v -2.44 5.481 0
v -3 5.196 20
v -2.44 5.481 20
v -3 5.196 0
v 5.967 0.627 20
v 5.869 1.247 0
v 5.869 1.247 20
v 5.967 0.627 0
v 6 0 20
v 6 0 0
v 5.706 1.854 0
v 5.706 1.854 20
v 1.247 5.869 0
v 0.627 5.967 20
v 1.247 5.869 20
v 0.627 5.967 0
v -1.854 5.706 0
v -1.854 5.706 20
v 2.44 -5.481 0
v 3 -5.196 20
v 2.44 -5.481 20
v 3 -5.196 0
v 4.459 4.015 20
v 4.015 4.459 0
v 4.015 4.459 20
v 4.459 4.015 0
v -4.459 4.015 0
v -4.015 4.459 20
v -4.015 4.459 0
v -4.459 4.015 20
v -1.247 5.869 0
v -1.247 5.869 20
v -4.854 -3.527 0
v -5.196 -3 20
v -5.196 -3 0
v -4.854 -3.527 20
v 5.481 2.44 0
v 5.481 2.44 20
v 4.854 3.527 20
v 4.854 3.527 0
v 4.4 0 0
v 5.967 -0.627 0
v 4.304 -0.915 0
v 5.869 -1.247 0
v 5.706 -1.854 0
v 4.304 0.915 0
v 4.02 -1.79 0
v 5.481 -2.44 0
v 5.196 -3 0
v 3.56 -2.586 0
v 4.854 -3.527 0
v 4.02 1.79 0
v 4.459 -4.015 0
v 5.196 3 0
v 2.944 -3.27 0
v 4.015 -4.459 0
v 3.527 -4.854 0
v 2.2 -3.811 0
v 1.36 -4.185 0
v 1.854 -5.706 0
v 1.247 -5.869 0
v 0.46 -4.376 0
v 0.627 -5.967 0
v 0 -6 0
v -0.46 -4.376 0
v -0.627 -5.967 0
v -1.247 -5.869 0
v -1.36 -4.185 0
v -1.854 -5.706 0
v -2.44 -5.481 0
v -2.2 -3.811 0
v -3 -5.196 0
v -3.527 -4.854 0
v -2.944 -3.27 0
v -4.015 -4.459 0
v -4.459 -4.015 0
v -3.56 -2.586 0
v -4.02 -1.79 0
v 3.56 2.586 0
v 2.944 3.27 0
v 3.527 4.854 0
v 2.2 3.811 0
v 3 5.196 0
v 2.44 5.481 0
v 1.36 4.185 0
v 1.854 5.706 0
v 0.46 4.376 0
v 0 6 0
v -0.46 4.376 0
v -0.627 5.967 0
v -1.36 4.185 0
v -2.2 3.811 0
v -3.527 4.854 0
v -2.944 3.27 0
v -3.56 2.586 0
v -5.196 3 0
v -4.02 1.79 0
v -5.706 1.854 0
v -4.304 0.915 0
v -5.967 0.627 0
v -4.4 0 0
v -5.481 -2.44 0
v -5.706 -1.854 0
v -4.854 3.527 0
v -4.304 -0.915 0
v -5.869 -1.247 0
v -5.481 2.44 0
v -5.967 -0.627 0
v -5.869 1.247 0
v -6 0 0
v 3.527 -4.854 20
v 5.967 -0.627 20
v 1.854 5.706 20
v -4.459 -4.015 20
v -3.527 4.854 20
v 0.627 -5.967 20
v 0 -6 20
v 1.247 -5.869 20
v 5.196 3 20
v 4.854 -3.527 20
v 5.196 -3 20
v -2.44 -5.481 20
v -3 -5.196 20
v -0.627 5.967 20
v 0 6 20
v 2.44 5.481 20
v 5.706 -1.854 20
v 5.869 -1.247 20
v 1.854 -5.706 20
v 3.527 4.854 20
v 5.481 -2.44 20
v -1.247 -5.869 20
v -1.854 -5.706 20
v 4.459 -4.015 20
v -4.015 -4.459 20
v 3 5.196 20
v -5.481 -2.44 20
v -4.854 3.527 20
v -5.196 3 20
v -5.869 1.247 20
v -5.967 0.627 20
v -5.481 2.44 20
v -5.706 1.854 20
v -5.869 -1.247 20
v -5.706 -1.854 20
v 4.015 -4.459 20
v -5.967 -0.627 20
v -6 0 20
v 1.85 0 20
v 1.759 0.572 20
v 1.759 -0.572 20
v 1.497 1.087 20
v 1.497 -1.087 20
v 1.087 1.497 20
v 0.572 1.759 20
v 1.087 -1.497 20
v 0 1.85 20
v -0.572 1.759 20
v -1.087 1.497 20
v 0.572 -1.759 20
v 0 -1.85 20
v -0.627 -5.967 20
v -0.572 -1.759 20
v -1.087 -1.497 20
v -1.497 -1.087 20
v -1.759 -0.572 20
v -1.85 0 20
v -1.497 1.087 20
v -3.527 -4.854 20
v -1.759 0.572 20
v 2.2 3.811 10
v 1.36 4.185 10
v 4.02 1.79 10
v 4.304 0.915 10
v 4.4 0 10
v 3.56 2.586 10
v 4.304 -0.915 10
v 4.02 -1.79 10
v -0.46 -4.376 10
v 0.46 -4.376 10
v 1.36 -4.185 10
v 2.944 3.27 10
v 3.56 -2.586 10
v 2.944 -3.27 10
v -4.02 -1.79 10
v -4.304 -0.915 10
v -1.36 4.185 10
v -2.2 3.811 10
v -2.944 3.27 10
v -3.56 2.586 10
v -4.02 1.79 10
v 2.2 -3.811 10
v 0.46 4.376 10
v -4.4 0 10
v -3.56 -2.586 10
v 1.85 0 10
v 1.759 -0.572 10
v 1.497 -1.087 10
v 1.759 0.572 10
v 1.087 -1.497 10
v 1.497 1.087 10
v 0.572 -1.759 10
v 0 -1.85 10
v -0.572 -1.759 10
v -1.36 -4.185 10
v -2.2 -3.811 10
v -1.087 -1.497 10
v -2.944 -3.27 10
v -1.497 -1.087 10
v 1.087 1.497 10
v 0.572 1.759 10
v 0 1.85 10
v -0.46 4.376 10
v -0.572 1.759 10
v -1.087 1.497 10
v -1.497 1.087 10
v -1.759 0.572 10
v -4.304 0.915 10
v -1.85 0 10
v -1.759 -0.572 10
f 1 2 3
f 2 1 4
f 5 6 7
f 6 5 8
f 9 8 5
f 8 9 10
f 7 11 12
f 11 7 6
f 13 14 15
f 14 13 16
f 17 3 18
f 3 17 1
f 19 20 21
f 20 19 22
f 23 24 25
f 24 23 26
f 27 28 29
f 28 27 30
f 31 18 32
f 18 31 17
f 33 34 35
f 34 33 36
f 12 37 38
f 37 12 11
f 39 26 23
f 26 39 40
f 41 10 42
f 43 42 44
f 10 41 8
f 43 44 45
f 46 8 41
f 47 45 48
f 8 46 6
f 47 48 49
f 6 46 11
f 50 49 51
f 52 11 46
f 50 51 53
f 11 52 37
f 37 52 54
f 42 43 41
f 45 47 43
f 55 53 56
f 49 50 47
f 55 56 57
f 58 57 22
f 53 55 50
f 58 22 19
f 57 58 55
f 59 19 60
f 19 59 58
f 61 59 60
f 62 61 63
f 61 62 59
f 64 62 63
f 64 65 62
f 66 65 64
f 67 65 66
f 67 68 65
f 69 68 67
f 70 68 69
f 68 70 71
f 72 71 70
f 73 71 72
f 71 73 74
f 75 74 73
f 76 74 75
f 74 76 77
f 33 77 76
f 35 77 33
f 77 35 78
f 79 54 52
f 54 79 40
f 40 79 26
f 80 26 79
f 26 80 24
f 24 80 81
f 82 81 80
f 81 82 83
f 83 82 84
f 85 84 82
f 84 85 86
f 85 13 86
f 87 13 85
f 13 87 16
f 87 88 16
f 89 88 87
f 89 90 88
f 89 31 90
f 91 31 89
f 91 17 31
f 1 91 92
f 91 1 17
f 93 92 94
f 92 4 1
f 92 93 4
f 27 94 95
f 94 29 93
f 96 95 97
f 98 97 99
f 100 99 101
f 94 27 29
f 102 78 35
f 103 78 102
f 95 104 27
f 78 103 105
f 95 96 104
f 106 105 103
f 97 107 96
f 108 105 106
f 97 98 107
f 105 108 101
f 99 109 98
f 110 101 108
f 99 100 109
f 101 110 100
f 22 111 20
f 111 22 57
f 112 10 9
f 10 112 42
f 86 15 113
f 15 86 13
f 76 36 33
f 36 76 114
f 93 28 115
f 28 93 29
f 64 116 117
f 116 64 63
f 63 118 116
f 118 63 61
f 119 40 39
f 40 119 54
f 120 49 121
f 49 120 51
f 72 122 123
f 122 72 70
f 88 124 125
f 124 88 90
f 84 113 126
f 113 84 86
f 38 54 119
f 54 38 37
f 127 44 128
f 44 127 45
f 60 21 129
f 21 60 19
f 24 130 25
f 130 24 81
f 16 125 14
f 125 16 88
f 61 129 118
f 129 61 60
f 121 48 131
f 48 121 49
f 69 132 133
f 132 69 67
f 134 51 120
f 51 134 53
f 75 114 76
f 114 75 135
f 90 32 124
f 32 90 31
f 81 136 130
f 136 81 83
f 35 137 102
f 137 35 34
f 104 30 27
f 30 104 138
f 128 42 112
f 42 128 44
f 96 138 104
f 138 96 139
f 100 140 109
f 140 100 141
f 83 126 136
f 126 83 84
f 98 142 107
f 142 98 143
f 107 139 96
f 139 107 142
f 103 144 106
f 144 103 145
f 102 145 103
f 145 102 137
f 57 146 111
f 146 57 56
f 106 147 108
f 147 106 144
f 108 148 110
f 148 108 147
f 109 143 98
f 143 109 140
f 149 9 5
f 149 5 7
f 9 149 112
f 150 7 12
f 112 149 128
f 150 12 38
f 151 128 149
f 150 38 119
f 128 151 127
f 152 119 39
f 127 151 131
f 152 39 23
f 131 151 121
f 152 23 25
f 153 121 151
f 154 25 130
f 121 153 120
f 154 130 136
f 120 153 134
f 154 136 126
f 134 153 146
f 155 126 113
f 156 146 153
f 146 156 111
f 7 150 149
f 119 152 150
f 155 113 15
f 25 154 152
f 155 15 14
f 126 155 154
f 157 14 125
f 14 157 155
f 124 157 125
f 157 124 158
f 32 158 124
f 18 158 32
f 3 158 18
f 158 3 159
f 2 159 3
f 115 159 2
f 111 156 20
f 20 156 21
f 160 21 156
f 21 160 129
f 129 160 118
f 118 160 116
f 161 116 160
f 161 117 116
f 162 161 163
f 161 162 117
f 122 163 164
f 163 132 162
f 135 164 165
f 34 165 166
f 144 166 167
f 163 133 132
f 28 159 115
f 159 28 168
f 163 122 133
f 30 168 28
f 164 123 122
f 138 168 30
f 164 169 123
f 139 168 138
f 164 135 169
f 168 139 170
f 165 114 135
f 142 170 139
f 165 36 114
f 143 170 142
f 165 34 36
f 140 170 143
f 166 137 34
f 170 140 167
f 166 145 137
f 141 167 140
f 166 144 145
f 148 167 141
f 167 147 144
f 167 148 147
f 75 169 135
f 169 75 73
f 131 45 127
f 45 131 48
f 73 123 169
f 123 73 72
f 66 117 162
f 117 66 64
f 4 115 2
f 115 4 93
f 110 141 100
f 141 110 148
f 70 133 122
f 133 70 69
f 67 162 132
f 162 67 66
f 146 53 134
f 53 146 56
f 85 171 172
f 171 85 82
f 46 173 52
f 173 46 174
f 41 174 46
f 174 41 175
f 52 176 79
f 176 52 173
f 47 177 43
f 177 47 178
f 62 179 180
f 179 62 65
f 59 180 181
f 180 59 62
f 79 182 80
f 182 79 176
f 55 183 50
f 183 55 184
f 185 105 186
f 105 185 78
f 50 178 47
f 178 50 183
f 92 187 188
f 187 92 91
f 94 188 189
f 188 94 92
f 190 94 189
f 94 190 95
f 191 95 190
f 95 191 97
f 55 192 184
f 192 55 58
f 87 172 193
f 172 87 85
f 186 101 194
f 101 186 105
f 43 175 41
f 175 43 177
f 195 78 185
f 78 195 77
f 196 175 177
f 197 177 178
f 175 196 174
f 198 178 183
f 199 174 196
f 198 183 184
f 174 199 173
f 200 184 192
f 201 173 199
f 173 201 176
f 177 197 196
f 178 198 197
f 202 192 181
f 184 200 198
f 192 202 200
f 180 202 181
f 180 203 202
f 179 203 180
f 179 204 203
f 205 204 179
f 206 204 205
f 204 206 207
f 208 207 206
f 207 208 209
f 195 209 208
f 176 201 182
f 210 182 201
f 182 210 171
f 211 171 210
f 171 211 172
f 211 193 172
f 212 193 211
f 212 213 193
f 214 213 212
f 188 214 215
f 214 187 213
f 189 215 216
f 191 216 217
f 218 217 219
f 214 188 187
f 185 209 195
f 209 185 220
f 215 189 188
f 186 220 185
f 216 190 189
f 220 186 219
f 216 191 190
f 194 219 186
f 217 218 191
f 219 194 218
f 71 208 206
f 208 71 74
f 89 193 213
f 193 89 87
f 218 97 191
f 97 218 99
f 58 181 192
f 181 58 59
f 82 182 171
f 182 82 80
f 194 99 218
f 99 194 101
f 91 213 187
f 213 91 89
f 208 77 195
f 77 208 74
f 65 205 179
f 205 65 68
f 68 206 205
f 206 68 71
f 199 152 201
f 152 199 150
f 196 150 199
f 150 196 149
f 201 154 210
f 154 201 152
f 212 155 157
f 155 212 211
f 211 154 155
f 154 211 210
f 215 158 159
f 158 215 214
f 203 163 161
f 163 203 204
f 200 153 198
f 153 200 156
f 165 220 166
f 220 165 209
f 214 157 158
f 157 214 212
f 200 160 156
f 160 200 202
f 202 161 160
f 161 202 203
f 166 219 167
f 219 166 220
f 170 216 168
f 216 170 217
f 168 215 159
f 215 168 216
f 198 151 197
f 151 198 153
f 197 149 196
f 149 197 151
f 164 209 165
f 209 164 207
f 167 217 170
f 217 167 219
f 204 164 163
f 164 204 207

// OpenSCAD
difference(){
cylinder(d=12,h=20,$fn=60);
cylinder(d=8.8,h=10,$fn=30);
translate([0,0,10])cylinder(d=3.7,h=20,$fn=20);
}
